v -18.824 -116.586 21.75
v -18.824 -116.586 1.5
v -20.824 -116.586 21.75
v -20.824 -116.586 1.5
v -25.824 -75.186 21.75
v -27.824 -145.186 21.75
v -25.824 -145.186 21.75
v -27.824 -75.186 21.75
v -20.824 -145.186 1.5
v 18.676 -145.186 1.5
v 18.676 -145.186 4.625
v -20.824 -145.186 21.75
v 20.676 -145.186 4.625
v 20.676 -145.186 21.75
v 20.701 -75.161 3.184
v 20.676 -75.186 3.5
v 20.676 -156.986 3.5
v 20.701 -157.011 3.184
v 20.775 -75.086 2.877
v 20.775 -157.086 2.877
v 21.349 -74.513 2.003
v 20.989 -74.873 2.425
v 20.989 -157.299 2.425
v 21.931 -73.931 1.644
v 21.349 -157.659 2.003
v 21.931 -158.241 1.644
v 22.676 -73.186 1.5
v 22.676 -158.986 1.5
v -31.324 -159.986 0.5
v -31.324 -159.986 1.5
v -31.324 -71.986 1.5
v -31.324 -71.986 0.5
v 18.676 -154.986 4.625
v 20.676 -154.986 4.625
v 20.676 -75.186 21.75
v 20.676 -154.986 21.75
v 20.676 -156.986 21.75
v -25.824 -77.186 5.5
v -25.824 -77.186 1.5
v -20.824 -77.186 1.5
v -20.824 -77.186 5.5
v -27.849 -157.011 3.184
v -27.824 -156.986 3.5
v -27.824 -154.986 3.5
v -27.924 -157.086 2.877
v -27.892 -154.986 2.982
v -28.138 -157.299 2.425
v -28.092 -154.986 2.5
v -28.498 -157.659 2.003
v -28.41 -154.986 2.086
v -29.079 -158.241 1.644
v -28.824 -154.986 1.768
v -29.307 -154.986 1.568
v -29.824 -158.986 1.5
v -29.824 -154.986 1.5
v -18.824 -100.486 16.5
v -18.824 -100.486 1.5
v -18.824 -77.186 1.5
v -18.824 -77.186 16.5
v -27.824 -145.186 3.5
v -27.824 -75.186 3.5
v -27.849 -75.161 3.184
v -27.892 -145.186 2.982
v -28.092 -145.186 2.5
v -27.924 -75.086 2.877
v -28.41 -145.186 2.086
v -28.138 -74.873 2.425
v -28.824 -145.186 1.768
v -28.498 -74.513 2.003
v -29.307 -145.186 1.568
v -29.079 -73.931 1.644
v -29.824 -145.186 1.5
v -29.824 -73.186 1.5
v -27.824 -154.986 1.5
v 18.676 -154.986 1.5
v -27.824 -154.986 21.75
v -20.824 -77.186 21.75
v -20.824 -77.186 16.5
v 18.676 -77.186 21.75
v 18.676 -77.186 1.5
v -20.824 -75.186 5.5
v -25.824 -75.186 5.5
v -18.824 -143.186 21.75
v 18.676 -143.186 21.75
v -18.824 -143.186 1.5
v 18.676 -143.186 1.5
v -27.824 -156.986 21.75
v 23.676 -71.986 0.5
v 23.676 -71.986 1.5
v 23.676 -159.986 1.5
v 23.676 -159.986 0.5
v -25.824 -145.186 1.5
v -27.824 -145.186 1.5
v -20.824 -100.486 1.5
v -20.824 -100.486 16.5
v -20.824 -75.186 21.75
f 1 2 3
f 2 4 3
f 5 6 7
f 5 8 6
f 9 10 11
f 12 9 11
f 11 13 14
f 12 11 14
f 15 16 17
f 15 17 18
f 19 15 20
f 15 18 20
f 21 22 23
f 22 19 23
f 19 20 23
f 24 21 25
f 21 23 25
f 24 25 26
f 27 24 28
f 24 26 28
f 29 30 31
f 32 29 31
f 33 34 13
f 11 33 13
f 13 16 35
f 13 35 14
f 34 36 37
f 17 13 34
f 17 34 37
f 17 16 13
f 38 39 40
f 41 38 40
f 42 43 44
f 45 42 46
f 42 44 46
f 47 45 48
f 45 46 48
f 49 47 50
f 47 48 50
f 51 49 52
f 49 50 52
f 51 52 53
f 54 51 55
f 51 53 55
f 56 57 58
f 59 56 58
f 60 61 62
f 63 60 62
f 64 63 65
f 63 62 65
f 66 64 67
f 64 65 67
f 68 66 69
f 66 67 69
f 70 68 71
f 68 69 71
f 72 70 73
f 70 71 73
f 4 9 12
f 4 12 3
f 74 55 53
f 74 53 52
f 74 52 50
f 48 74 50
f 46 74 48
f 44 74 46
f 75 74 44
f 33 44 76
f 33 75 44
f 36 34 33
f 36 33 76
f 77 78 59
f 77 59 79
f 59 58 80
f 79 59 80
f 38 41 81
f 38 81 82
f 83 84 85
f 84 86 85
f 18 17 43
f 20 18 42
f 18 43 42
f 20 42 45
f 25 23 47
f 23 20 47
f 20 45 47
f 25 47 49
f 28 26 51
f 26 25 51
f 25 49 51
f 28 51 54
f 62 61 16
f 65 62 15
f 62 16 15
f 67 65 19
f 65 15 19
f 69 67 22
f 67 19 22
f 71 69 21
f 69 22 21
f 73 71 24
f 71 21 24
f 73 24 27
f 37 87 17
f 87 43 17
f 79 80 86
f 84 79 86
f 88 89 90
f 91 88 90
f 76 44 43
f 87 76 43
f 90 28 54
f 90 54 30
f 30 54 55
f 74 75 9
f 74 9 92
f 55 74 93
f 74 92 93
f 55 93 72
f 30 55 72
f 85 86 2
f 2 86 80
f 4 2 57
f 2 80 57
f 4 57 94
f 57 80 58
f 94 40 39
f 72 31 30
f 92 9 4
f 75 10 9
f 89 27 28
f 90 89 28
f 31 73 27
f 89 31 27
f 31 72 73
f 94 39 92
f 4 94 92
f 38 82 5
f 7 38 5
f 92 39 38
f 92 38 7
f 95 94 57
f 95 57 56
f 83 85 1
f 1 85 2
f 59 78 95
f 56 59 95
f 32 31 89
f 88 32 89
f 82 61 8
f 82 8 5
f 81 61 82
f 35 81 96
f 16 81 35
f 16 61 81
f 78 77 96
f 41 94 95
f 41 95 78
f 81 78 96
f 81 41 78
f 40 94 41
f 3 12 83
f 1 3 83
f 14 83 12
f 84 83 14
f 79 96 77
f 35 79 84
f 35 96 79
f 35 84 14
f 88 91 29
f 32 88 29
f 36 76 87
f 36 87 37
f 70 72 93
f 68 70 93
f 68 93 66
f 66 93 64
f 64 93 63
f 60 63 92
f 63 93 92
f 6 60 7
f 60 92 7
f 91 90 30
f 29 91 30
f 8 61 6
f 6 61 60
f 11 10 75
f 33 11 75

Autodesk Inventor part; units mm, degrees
ref_plane "YZ Plane" through (0, 0, 0) normal (1, 0, 0) x (0, 1, 0)
ref_plane "XZ Plane" through (0, 0, 0) normal (0, 1, 0) x (-1, 0, 0)
ref_plane "Plano de trabajo1" through (0, 0, 0) normal (0, 0, 1) x (1, 0, 0)
sketch "Boceto1" plane through (0, 0, 0) normal (0, 0, 1) x (1, 0, 0)
  line L0 (0.4509, -110.4895) -> (0.451, -110.4898) projected
  line L1 (0.4512, -110.4895) -> (0.4509, -110.4895) projected
  line L2 (-0.0742, -109.5793) -> (0.4512, -110.4895) projected
  line L3 (-0.5999, -110.4893) -> (0.1885, -110.0344)
  line L4 (0.4512, -110.4895) -> (-0.3337, -110.0363)
  line L5 (0.4512, -110.4895) -> (-0.5999, -110.4895)
  line L6 (-0.5999, -110.4895) -> (-0.0743, -109.5792)
  line L7 (-0.0743, -109.5792) -> (0.4512, -110.4895)
  line L8 (-95.0743, -55.3377) -> (94.9257, -55.3377)
  line L9 (94.9257, -55.3377) -> (-0.0743, -219.8826)
  line L10 (-0.0743, -219.8826) -> (-95.0743, -55.3377)
  point P0 (0, 0)
  point P1 (-0.0743, -110.186)
  point P2 (-0.0743, -110.186)
  point P3 (0.1885, -110.0344)
  dimension "d0" = 190
extrude "Extrusión1" add sketch "Boceto1" along normal blind 1.5 contours L2 L3 L6 | L2 L4 L3 | L3 L4 L5 | L8 L9 L10
fillet "Empalme1" radius 30 3 edges at (-95.0743, -55.3377, 0.75) (94.9257, -55.3377, 0.75) (-0.0743, -219.8826, 0.75)
sketch "Boceto2" plane through (0, 0, 1.5) normal (0, 0, 1) x (1, 0, 0)
  line L0 (25.9064, -174.8826) -> (68.9449, -100.3377) projected
  line L1 (42.9642, -55.3377) -> (-43.1128, -55.3377) projected
  line L2 (-69.0936, -100.3377) -> (-26.0551, -174.8826) projected
  line L3 (0.4512, -110.4895) -> (0.1885, -110.0344) projected
  line L4 (0.1885, -110.0344) -> (0.1885, -110.0344) projected
  line L5 (0.1885, -110.0344) -> (0.4512, -110.4895) projected
  line L6 (-0.0743, -219.8826) -> (94.9257, -55.3377) projected
  line L7 (-0.0743, -219.8826) -> (-0.0743, -55.3377)
  line L8 (-18.8243, -77.186) -> (18.6757, -77.186)
  line L9 (18.6757, -77.186) -> (18.6757, -143.186)
  line L10 (18.6757, -143.186) -> (-18.8243, -143.186)
  line L11 (-18.8243, -143.186) -> (-18.8243, -77.186)
  line L12 (-18.8243, -77.186) -> (18.6757, -143.186) construction
  line L13 (18.6757, -77.186) -> (-18.8243, -143.186) construction
  line L14 (-20.8243, -75.186) -> (20.6757, -75.186)
  line L15 (20.6757, -75.186) -> (20.6757, -145.186)
  line L16 (20.6757, -145.186) -> (-20.8243, -145.186)
  line L17 (-20.8243, -145.186) -> (-20.8243, -75.186)
  line L18 (94.9257, -55.3377) -> (57.0834, -77.186)
  arc A0 (-26.0551, -174.8826) -> (25.9064, -174.8826) centre (-0.0743, -159.8826) ccw projected
  arc A1 (68.9449, -100.3377) -> (42.9642, -55.3377) centre (42.9642, -85.3377) ccw projected
  arc A2 (-43.1128, -55.3377) -> (-69.0936, -100.3377) centre (-43.1128, -85.3377) ccw projected
  point P0 (0, 0)
  dimension "d4" = 37.5
  dimension "d5" = 66
  dimension "d6" = 2
extrude "Extrusión2" add sketch "Boceto2" along normal blind 20.25 contours L16 L17 L14 L7 L8 L11 L10 | L7 L10 L9 L8 L14 L15 L16
sketch "Boceto3" plane through (-20.8243, -145.186, 21.75) normal (-1, 0, 0) x (0, 0, 1)
  line L0 (-20.25, 0) -> (0, 0) projected
  line L1 (0, 70) -> (0, 0) projected
  line L2 (-20.25, 70) -> (0, 70) projected
  line L3 (0, 70) -> (-18.05, 70)
  line L4 (-18.05, 70) -> (-18.05, 44.7)
  line L5 (-18.05, 44.7) -> (0, 44.7)
  line L6 (0, 44.7) -> (0, 70)
  line L7 (-20.25, 0) -> (-20.25, 70) projected
  line L8 (0, 0) -> (-17, 0)
  line L9 (-17, 0) -> (-17, 28.6)
  line L10 (-17, 28.6) -> (0, 28.6)
  line L11 (0, 28.6) -> (0, 0)
  line L12 (-18.05, 44.7) -> (-20.25, 44.7)
  line L13 (-17, 28.6) -> (-20.25, 28.6)
  point P0 (-21.75, 145.186)
  point P1 (0, 28.6)
  point P2 (0, 44.7)
  dimension "d10" = 18.05
  dimension "d11" = 25.3
  dimension "d12" = 17
  dimension "d13" = 28.6
sketch "Boceto4" plane through (0, 0, 1.5) normal (0, 0, 1) x (1, 0, 0)
  line L0 (20.6757, -145.186) -> (20.6757, -75.186) projected
  line L1 (20.6757, -75.186) -> (-20.8243, -75.186) projected
  line L2 (-20.8243, -75.186) -> (-20.8243, -145.186) projected
  line L3 (-20.8243, -145.186) -> (20.6757, -145.186) projected
  line L4 (18.6757, -143.186) -> (-18.8243, -143.186) projected
  line L5 (-18.8243, -143.186) -> (-18.8243, -77.186) projected
  line L6 (-18.8243, -77.186) -> (18.6757, -77.186) projected
  line L7 (18.6757, -77.186) -> (18.6757, -143.186) projected
  line L8 (-25.8243, -75.186) -> (-25.8243, -145.186)
  line L9 (-25.8243, -75.186) -> (-27.8243, -75.186)
  line L10 (-27.8243, -75.186) -> (-27.8243, -156.986)
  line L11 (-27.8243, -145.186) -> (-25.8243, -145.186)
  line L12 (-20.8243, -154.986) -> (-20.8243, -156.986)
  line L13 (-20.8243, -156.986) -> (20.6757, -156.986)
  line L14 (20.6757, -156.986) -> (20.6757, -154.986)
  line L15 (20.6757, -154.986) -> (-20.8243, -154.986)
  line L16 (-20.8243, -156.986) -> (-27.8243, -156.986)
  line L17 (-25.8243, -145.186) -> (-25.8243, -154.986)
  line L18 (-25.8243, -154.986) -> (-20.8243, -154.986)
  line L19 (20.6757, -145.186) -> (20.6757, -154.986)
  line L20 (20.6757, -145.186) -> (18.6757, -145.186)
  line L21 (18.6757, -145.186) -> (18.6757, -154.986)
  line L22 (-20.8243, -75.186) -> (-25.8243, -75.186)
  line L23 (-20.8243, -75.186) -> (-20.8243, -77.186)
  line L24 (-20.8243, -77.186) -> (-25.8243, -77.186)
  point P0 (0, 0)
  dimension "d19" = 2
  dimension "d22" = 2
  dimension "d23" = 2
extrude "Extrusión3" add sketch "Boceto4" along normal blind 20.25 contours L19 L15 L21 L3 | L14 L13 L12 L15 | L2 L24 L8 L22 | L8 L11 L10 L9 | L12 L16 L10 L11 L17 L18
extrude "Extrusión4" cut sketch "Boceto3" against normal up to surface (2 mm away) contours L7 L12 L5 L1 L10 L13
sketch "Boceto5" plane through (-20.8243, -77.186, 1.5) normal (-1, 0, 0) x (0, 0, 1)
  line L0 (0, 0) -> (15, 0)
  line L1 (15, 0) -> (15, -23.3)
  line L2 (15, -23.3) -> (0, -23.3)
  line L3 (0, -23.3) -> (0, 0)
  line L4 (0, -23.3) -> (20.25, -23.3) projected
  line L5 (20.25, 0) -> (20.25, -23.3) projected
  line L6 (20.25, 0) -> (0, 0) projected
  line L7 (0, -23.3) -> (0, 0) projected
  point P0 (-1.5, 77.186)
  point P1 (15, -23.3)
  dimension "d26" = 15
  dimension "d27" = 23.3
extrude "Extrusión5" cut sketch "Boceto5" against normal up to surface (2 mm away) contours L6 L5 L4 L1
sketch "Boceto6" plane through (-25.8243, -154.986, 1.5) normal (1, 0, 0) x (0, 0, -1)
  line L0 (0, 9.8) -> (-20.25, 9.8) projected
  line L1 (0, 77.8) -> (0, 0) projected
  line L2 (0, 77.8) -> (-20.25, 77.8) projected
  line L3 (-20.25, 0) -> (-20.25, 77.8) projected
  line L4 (0, 0) -> (-20.25, 0) projected
  line L5 (0, 0) -> (-11.6, 0)
  line L6 (-11.6, 0) -> (-11.6, 9.8)
  line L7 (-11.6, 9.8) -> (0, 9.8)
  line L8 (0, 9.8) -> (0, 0)
  point P0 (1.5, 154.986)
  dimension "d30" = 11.6
extrude "Extrusión6" cut sketch "Boceto6" against normal up to surface (2 mm away) contours L1 L4 L6 L0 | L6 L4 L3 L0
sketch "Boceto7" plane through (-18.8243, -77.186, 1.5) normal (0, -1, 0) x (1, 0, 0)
  line L0 (-2, 0) -> (-7, 0) projected
  line L1 (-2, 15) -> (-2, 0) projected
  line L2 (-2, 15) -> (0, 15) projected
  line L3 (0, 0) -> (0, 15) projected
  line L4 (37.5, 0) -> (0, 0) projected
  line L5 (37.5, 0) -> (37.5, 20.25) projected
  line L6 (-7, 20.25) -> (37.5, 20.25) projected
  line L7 (-7, 0) -> (-7, 20.25) projected
  line L8 (-2, 15) -> (-2, 20.25)
  line L9 (-7, 0) -> (-2, 0)
  line L10 (-2, 0) -> (-2, 4)
  line L11 (-2, 4) -> (-7, 4)
  line L12 (-7, 4) -> (-7, 0)
  point P0 (18.8243, -1.5)
  point P1 (-7, 4)
  dimension "d35" = 4
extrude "Extrusión7" cut sketch "Boceto7" against normal up to surface (2 mm away) contours L11 L7 L6 L8 L1
ref_plane "Plano de trabajo2" through (0, 0, 1.5) normal (0, 0, 1) x (1, 0, 0)
split "Dividir1" plane through (0, 0, 1.5) removes the side toward (0, 0, -1)
sketch "Boceto8" plane through (20.6757, -156.986, 1.5) normal (0, 0, -1) x (-1, 0, 0)
  line L0 (48.5, 0) -> (0, 0) projected
  line L1 (24.2796, 40.9499) -> (48.5, 0)
  line L2 (48.5, 81.8) -> (48.5, 11.8) projected
  line L3 (0, 0) -> (0, 81.8) projected
  line L4 (24.2796, 40.9499) -> (0, 0)
  point P0 (20.6757, 156.986)
ref_plane "Plano de trabajo3" through (-3.5743, -110.9343, 1.5) normal (0, 0, 1) x (1, 0, 0)
sketch "Boceto9" plane through (20.6757, -156.986, 21.75) normal (1, 0, 0) x (0, 0, -1)
  line L0 (20.25, 81.8) -> (20.25, 0) projected
  line L1 (20.25, 81.8) -> (0, 81.8) projected
  line L2 (0, 0) -> (0, 81.8) projected
  line L3 (20.25, 0) -> (0, 0) projected
  line L4 (20.25, 2) -> (20.25, 11.8) projected
  line L5 (20.25, 2) -> (0, 2) projected
  line L6 (0, 11.8) -> (0, 2) projected
  line L7 (20.25, 11.8) -> (0, 11.8) projected
  line L8 (0, 2) -> (20.25, 11.8)
  line L9 (17.125, 2.15) -> (3.125, 2.15)
  line L10 (3.125, 2.15) -> (3.125, 11.65)
  line L11 (3.125, 11.65) -> (17.125, 11.65)
  line L12 (17.125, 11.65) -> (17.125, 2.15)
  line L13 (17.125, 2.15) -> (3.125, 11.65) construction
  line L14 (3.125, 2.15) -> (17.125, 11.65) construction
  line L15 (3.125, 2) -> (17.125, 2)
  line L16 (17.125, 2) -> (17.125, 11.8)
  line L17 (17.125, 11.8) -> (3.125, 11.8)
  line L18 (3.125, 11.8) -> (3.125, 2)
  point P0 (21.75, 156.986)
  point P1 (12.7514, 35.7395)
  point P2 (10.125, 6.9)
  point P3 (3.125, 11.65)
  point P4 (3.125, 2.15)
  point P5 (3.125, 11.65)
  point P6 (3.125, 2.15)
  point P7 (17.125, 2.15)
  point P8 (17.125, 10.2877)
  point P9 (17.125, 11.65)
  dimension "d43" = 14
  dimension "d44" = 9.5
extrude "Extrusión8" cut sketch "Boceto9" against normal up to surface (2 mm away) contours L16 L11 L18 L7 | L12 L9 L10 L8 | L8 L10 L11 L12 | L7 L18 L10 L8 L2 | L5 L18 L9 L16 | L10 L18 L5 L8
sketch "Boceto10" plane through (20.6757, -156.986, 1.5) normal (0, 0, -1) x (-1, 0, 0)
  line L0 (49, 82) -> (0, 82)
  line L1 (0, 82) -> (0, 0)
  line L2 (0, 0) -> (49, 0)
  line L3 (49, 0) -> (49, 82)
  line L4 (52, 85) -> (-3, 85)
  line L5 (-3, 85) -> (-3, -3)
  line L6 (-3, -3) -> (52, -3)
  line L7 (52, -3) -> (52, 85)
  point P0 (20.6757, 156.986)
  dimension "d47" = 3
extrude "Extrusión9" add sketch "Boceto10" along normal blind 1 contours L3 L2 L1 L0 | L7 L6 L5 L4
fillet "Empalme3" radius 2 5 edges at (-27.8243, -110.186, 1.5) (-27.8243, -155.986, 1.5) (-3.5743, -156.986, 1.5) (20.6757, -116.086, 1.5) (-3.5743, -75.186, 1.5)
properties part number "Base4Baterias"
